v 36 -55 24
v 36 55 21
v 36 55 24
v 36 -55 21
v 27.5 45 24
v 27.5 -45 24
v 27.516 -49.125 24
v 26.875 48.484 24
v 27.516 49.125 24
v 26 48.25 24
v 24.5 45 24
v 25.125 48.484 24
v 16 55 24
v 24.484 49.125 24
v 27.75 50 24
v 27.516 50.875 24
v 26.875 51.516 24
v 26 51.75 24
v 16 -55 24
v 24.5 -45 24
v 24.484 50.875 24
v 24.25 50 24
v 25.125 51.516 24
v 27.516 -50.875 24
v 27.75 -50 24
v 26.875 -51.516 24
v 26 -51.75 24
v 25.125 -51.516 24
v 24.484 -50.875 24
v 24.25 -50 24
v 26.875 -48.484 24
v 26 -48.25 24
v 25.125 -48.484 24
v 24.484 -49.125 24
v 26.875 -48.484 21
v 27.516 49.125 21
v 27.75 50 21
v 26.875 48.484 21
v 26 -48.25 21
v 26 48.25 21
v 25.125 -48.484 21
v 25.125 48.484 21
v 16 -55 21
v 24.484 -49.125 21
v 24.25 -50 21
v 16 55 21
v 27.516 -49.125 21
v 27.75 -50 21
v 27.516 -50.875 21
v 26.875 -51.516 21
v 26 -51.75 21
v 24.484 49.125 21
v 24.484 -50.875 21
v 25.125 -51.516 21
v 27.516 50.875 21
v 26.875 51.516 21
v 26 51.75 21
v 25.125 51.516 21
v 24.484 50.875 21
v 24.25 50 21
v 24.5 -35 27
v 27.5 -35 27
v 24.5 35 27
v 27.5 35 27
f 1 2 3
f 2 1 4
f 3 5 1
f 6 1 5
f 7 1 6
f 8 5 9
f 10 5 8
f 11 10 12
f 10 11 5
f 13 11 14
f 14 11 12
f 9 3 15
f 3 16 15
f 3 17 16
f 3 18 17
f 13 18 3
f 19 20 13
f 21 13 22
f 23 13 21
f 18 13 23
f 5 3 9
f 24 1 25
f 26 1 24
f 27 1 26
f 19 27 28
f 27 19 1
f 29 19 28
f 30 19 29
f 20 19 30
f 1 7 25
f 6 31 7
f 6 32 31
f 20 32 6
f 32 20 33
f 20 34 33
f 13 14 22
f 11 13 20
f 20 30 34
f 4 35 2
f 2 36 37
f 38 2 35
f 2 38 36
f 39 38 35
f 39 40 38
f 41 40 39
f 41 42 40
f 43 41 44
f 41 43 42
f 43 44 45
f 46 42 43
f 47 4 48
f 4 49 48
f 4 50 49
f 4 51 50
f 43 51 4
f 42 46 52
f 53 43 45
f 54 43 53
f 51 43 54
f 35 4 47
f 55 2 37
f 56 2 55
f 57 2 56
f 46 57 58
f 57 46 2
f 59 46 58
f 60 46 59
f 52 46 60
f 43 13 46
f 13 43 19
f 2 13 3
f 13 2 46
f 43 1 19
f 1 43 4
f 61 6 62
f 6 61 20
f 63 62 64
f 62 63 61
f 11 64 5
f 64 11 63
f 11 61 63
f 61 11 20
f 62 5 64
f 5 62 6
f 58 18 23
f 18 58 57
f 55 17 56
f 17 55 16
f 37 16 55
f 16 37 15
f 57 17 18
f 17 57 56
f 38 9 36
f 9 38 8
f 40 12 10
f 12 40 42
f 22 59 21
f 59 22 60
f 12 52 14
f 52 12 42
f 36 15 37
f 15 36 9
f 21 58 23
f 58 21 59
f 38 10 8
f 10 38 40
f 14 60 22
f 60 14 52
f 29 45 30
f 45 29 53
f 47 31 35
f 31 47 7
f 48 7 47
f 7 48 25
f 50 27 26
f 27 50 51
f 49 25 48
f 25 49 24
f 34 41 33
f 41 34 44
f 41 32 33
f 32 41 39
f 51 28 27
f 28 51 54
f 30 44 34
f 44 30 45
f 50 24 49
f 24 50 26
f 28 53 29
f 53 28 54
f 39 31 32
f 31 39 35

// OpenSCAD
// file: center_plate.scad
$fs=1.0;

center_plate();

module center_plate_2d(){
    difference(){
        hull(){
            square([103, 114.5], center=true);
            square([200, 50], center=true);
        }
        circle(d=30);
        
        // nema 17 motor mount
        translate([-13-(30+26)/2, 0]){
            circle(d=26);
            translate([31/2, 31/2]) circle(d=3.4);
            translate([-31/2, 31/2]) circle(d=3.4);
            translate([31/2, -31/2]) circle(d=3.4);
            translate([-31/2, -31/2]) circle(d=3.4);
        }
        
        // cable holes
        translate([22+(15+30)/2, 55/2]) circle(d=15);
        translate([22+(15+30)/2, -55/2]) circle(d=15);
        translate([22+(15+30)/2, 3+(55+15+3.4)/2]) circle(d=3.4);
        translate([22+(15+30)/2, -3-(55+15+3.4)/2]) circle(d=3.4);
        
        // mounting holes
        translate([0, (114.5-2.6)/2-5.5]) circle(d=3.0);
        translate([0, -(114.5-2.6)/2+5.5]) circle(d=3.0);
        
        translate([103/2, (114.5-2.6)/2-5.5]) circle(d=3.4);
        translate([-103/2, (114.5-2.6)/2-5.5]) circle(d=3.4);
    }
}

module center_plate(t=2.3){
    translate([0,0,-t]) linear_extrude(height=t){
        center_plate_2d();
    }
}
// file: mipi_controller.scad
pcb_thickness = 1.0;

hole_dia_small = 2.05;
hole_dia_large = 2.8;

corner_radius = 4.0;

pcb_large();

translate([60,0,0]) pcb_small();

translate([0,70,34/2]){
    lcd();
    cylinder(d=30, h=2, center=true);
}

module pcb_small(){
    difference(){
        union(){
            color("SteelBlue") cube([42.7, 24.0, pcb_thickness], center=true);
            translate([0,24/2-4.7/2-1.3,pcb_thickness/2]) flex_connector();
            color("DimGray") translate([2.5/2-42.7/2+3.8,12.5/2-24/2+3.8,0.5]) cube([2.5, 12.5, 1.0], center=true);
        }
        translate([(41-hole_dia_small)/2, (22.6-hole_dia_small)/2, 0]) 
            cylinder(d=hole_dia_small, h=pcb_thickness*3, center=true, $fn=16);
        translate([-(41-hole_dia_small)/2, (22.6-hole_dia_small)/2, 0]) 
            cylinder(d=hole_dia_small, h=pcb_thickness*3, center=true, $fn=16);
        translate([(41-hole_dia_small)/2, -(22.6-hole_dia_small)/2, 0]) 
            cylinder(d=hole_dia_small, h=pcb_thickness*3, center=true, $fn=16);
        translate([-(41-hole_dia_small)/2, -(22.6-hole_dia_small)/2, 0]) 
            cylinder(d=hole_dia_small, h=pcb_thickness*3, center=true, $fn=16);
    }
}

module pcb_large(){
    difference(){
        union(){
            color("SteelBlue") hull(){
                translate([(65-corner_radius)/2, (64-corner_radius)/2, 0]) 
                    cylinder(d = corner_radius, h = pcb_thickness, $fn=16, center=true);
                translate([-(65-corner_radius)/2, (64-corner_radius)/2, 0]) 
                    cylinder(d = corner_radius, h = pcb_thickness, $fn=16, center=true);
                translate([(65-corner_radius)/2, -(64-corner_radius)/2, 0]) 
                    cylinder(d = corner_radius, h = pcb_thickness, $fn=16, center=true);
                translate([-(65-corner_radius)/2, -(64-corner_radius)/2, 0]) 
                    cylinder(d = corner_radius, h = pcb_thickness, $fn=16, center=true);
            }
            translate([0,(64-4.7)/2-1.3,pcb_thickness/2]) flex_connector();
            // HDMI:
            translate([0, -(64-11.6)/2-1.3,(6+pcb_thickness)/2]) color("Silver") 
                cube([15,11.6, 6], center=true);
            // USB:
            translate([7.7-(65-8)/2, -(64-6)/2-0.6,(2.5+pcb_thickness)/2]) color("Silver") 
                cube([8, 6, 2.5], center=true);
            
        }
        translate([(55.3+hole_dia_large)/2, 2.1-(64-hole_dia_large)/2, 0])
            cylinder(d=hole_dia_large, h=pcb_thickness*3, $fn=16, center=true);
        translate([-(55.3+hole_dia_large)/2, 2.1-(64-hole_dia_large)/2, 0])
            cylinder(d=hole_dia_large, h=pcb_thickness*3, $fn=16, center=true);
        
        translate([(55.3+hole_dia_large)/2, hole_dia_large+46.4+2.1-(64-hole_dia_large)/2, 0])
            cylinder(d=hole_dia_large, h=pcb_thickness*3, $fn=16, center=true);
        translate([-(55.3+hole_dia_large)/2, hole_dia_large+46.4+2.1-(64-hole_dia_large)/2, 0])
            cylinder(d=hole_dia_large, h=pcb_thickness*3, $fn=16, center=true);
    }
}

module flex_connector(){
    color("White") translate([0,0,2.1/2]) cube([35.1, 4.7, 2.1], center=true);
}

module lcd(){
    color("Silver") cube([127.6, 69.85, 0.6], center=true);
}
// main file
use <mipi_controller.scad>;
use <center_plate.scad>;

foam_thickness = 16;

//translate([-18,0,34/2]) lcd();
//center_plate();

//translate([-35,0,0]) foam_bottom_left();
//translate([30,0,0]) foam_bottom_right();
//translate([26,0,3+34/2]) foam_strip();
//translate([-26,0,3+34/2]) foam_strip();

//lcd_holder_base_top();
//lcd_holder_base_bottom();

//translate([-26,0,21]) lcd_holder_cover_left();
translate([26,0,21]) lcd_holder_cover_right();

module foam_bottom_right(){
    color("Gray") linear_extrude(height=foam_thickness){
        translate([-29/2, -51/2]) hull(){
            square([17, 51]);
            translate([0,(51-26)/2]) square([29, 26]);
        }
    }
}

module foam_bottom_left(){
    color("Gray") translate([0,0, foam_thickness/2]) 
        cube([38, 60, foam_thickness], center=true);
}

module foam_strip(){
    color("Gray") cube([20,90,5.5], center=true);
}

module lcd_holder_base_bottom(){
    mirror([0,1,0]) lcd_holder_base_top();
}

module lcd_holder_base_top(){
    color("Green") translate([0,52,3]){
        difference(){
            union(){
                cube([112, 15, 6], center=true);
                translate([0,15/2-1,-2]) cube([112, 2, 10], center=true);
                
                translate([26,0,3]) lcd_holder_cover_mount();
                translate([-26,0,3]) lcd_holder_cover_mount();
                
                hull(){
                    translate([-112/2,0,0]) cube([0.5, 15, 6], center=true);
                    translate([-112/2-30,-20,0]) cube([0.5, 15, 6], center=true);
                }
                translate([-112/2-30,-20-7.5, 3]) cube([15,15,15]);
            }
            // mounting holes
            translate([0,-1.55,0]) cylinder(d=3.5, h=12, center=true, $fn=10);
            translate([103/2,-1.55,0]) cylinder(d=3.5, h=12, center=true, $fn=10);
            translate([-103/2,-1.55,0]) cylinder(d=3.5, h=12, center=true, $fn=10);
            
            translate([0,-1.55,-3]) cylinder(d=6.5, h=2, $fn=10);
            translate([0,-1.55,0]) cylinder(d=6, h=4, $fn=10);
            translate([103/2,-1.55,0]) cylinder(d=6, h=4, $fn=10);
            translate([-103/2,-1.55,0]) cylinder(d=6, h=4, $fn=10);
            
            // corner cutout
            
            translate([2-112/2-30,-2-20-7.5, 2.99]) cube([15,15,16]);
        }
    }
}

module lcd_holder_cover_mount(){
    difference(){
        union(){
            translate([-26/2,1.5,0]) cube([26, 6, 10]);
            translate([-26/2,1.5-8,0]) cube([8, 8, 10]);
            translate([26/2-8,1.5-8,0]) cube([8, 8, 10]);
            translate([-26/2,1.5-8,10]) cube([26, 14, 7]);
        }
        translate([0,-2,13]) cylinder(d=3.5, h=14, center=true, $fn=12);
        translate([0,-2,9]) cylinder(d2=6, d1=6.8, h=3, $fn=6);
        translate([-21/2,-8,17-2]) cube([21,12, 4]);
    }
}

module lcd_holder_cover_left(){
    color("Lime") difference(){
        union(){
            translate([0,0,3/2]) cube([20, 110, 3], center=true);
            hull(){
                translate([0,0,3/2]) cube([3, 90, 3], center=true);
                translate([0,0,3+3/2]) cube([3, 70, 3], center=true);
            }
        }
        translate([0,50,0]) cylinder(d=3.5, h=8, center=true, $fn=12);
        translate([0,-50,0]) cylinder(d=3.5, h=8, center=true, $fn=12);
    }
}

module lcd_holder_cover_right(){
    lcd_holder_cover_left();
}
